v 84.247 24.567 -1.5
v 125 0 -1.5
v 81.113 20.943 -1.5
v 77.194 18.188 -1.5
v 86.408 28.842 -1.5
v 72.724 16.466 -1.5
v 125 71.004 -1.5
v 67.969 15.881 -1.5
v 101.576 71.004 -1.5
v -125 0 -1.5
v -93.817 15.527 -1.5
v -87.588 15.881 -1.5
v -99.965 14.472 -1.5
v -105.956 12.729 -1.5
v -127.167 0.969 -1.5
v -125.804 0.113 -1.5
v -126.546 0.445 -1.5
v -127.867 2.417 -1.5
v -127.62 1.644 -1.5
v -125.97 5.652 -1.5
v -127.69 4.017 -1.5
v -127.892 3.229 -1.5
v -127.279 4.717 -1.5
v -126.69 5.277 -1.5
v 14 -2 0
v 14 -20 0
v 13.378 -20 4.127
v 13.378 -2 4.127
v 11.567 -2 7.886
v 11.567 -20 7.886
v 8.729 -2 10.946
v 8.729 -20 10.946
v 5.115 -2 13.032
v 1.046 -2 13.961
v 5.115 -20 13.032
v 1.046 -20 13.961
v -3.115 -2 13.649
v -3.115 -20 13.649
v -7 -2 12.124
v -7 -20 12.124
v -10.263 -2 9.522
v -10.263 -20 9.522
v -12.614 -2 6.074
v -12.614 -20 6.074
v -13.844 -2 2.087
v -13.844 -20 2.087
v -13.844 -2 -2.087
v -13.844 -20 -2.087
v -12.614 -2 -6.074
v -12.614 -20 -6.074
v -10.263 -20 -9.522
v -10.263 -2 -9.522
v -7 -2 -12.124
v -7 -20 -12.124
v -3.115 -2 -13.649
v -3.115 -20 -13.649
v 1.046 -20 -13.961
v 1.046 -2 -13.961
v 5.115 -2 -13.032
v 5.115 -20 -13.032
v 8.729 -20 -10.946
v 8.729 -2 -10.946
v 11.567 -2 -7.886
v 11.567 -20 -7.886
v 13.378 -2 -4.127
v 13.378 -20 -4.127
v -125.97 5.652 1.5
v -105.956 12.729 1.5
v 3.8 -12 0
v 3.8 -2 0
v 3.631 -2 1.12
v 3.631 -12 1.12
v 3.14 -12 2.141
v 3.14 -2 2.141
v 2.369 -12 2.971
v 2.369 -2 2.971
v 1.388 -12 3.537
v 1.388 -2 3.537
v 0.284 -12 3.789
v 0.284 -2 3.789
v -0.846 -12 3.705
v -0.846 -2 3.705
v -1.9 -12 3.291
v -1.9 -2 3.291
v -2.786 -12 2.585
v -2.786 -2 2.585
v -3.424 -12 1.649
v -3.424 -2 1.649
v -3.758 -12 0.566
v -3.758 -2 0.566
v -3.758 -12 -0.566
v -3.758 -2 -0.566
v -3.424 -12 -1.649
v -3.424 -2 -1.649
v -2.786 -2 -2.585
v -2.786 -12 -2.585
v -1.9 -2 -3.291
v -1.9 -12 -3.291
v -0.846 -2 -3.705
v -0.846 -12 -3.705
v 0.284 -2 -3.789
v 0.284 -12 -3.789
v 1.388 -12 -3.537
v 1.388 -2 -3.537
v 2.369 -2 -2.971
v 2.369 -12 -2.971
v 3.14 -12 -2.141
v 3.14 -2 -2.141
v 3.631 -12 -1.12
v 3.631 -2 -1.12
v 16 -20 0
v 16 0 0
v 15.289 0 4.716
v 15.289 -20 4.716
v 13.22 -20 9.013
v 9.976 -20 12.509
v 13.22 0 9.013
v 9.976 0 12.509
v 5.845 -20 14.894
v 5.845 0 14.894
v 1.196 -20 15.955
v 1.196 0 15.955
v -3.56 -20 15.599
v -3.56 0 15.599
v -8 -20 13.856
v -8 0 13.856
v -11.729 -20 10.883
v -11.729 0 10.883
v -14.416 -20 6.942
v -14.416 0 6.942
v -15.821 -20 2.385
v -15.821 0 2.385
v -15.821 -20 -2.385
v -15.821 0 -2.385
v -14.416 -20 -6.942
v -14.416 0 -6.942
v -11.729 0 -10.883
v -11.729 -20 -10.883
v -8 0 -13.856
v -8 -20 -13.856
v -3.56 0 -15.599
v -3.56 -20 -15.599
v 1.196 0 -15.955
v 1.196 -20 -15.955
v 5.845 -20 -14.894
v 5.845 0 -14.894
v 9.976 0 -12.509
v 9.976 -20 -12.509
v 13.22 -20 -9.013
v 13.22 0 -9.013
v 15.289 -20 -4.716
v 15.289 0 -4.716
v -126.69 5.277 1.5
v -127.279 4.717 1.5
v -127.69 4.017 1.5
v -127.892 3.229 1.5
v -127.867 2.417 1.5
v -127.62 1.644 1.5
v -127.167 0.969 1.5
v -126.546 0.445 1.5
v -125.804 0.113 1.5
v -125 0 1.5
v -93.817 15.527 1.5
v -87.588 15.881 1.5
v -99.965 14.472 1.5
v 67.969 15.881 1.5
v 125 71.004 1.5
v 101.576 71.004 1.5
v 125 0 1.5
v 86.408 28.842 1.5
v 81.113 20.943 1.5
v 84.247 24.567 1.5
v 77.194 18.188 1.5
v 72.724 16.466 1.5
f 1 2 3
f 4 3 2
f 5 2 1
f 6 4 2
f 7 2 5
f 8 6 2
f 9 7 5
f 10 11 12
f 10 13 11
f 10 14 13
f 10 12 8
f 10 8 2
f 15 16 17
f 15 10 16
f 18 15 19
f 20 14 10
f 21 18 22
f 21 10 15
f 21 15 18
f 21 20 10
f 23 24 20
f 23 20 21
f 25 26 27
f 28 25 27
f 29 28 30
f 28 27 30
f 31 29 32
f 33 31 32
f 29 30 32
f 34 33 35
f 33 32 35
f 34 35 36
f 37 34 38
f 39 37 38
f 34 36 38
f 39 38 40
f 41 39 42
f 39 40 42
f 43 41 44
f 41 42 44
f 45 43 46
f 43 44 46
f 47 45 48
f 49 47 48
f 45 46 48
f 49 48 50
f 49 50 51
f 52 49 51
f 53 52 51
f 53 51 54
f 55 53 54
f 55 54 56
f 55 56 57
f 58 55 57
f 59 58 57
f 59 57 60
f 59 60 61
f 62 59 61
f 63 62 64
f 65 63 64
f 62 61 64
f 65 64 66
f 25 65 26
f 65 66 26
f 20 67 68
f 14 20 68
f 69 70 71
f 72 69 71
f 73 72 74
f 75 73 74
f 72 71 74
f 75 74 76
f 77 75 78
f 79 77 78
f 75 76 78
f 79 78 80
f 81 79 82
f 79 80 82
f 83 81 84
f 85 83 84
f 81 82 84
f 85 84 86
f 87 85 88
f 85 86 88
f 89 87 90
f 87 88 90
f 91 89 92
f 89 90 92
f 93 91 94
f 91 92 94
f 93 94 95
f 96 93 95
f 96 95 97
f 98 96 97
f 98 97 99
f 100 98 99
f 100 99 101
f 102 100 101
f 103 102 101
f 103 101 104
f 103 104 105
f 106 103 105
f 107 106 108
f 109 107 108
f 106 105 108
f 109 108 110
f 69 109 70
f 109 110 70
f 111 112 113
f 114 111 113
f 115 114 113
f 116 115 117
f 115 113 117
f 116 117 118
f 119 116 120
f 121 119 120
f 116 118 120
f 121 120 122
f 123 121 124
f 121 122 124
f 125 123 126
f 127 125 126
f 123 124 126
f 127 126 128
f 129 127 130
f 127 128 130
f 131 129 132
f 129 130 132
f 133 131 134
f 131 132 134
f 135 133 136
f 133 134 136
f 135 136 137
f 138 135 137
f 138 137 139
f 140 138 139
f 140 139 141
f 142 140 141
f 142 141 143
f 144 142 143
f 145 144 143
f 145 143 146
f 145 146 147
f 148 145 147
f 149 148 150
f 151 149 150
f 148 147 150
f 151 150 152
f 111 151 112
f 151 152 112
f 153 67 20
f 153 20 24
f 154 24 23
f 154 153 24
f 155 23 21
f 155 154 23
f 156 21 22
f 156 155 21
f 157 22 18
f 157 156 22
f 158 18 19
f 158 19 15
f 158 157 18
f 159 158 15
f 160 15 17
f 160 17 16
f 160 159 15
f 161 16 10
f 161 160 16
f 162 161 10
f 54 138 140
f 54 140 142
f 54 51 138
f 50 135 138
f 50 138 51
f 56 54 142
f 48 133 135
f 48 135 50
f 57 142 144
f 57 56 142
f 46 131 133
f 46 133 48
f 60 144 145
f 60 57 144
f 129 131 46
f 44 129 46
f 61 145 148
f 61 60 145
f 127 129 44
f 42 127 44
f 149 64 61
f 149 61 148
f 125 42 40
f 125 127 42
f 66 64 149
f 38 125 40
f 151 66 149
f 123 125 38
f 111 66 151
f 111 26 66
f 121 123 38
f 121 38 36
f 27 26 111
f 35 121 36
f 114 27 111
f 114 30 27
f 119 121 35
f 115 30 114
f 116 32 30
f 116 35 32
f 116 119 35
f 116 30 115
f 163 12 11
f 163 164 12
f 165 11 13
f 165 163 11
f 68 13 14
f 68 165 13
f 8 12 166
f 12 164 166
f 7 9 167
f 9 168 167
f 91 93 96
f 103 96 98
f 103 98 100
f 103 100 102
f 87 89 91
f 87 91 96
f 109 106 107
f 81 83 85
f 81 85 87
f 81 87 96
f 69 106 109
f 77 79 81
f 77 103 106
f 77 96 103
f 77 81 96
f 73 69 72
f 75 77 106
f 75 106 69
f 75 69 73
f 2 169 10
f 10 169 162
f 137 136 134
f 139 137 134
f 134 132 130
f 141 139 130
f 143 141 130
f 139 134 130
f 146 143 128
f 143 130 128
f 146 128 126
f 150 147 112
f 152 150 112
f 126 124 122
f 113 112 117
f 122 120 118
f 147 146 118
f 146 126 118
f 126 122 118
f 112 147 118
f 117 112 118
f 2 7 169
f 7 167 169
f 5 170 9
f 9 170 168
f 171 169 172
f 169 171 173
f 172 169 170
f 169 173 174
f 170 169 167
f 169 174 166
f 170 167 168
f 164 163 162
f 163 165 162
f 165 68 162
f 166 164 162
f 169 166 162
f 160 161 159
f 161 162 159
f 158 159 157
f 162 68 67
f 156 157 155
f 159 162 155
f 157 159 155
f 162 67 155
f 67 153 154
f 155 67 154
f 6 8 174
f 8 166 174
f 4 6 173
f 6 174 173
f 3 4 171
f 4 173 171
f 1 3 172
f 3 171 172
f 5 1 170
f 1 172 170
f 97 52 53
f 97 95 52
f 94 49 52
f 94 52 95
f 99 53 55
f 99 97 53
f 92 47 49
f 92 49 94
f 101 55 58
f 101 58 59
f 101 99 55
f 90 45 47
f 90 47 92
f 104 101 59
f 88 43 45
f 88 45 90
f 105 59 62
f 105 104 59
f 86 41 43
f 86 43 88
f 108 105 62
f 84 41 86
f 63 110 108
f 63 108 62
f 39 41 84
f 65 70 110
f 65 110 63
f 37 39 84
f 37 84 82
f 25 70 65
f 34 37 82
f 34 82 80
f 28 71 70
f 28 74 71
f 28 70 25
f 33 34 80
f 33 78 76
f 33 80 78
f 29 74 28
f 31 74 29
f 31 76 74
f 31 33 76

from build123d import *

# Parameters (mm, degrees)
PAD002_DEPTH    = 1.5
COPYSKETCH005_R = 16
PAD_DEPTH       = 20
COPYSKETCH006_R = 14
POCKET_DEPTH    = 18
COPYSKETCH007_R = 3.8
PAD001_DEPTH    = 10


with BuildPart() as body001:
    # CopySketch004 → Pad002 (new body, symmetric)
    with BuildSketch(Plane.XY):
        with BuildLine():
            Line((-125.969839, 5.652203), (-105.955548, 12.728901))
            ThreePointArc((-87.587906, 15.880533), (-96.90594, 15.08691), (-105.955548, 12.728901))
            Line((-87.587906, 15.880533), (-56.304531, 15.880533))
            Line((-56.304531, 15.880533), (67.96893, 15.880533))
            ThreePointArc((67.96893, 15.880533), (79.23833, 19.445245), (86.407644, 28.842452))
            Line((86.407644, 28.842452), (101.576416, 71.003891))
            Line((101.576416, 71.003891), (125, 71.003891))
            Line((125, 71.003891), (125, 0))
            Line((125, 0), (-125, 0))
            ThreePointArc((-125.969839, 5.652203), (-127.867402, 2.4173), (-125, 0))
        make_face()
    extrude(amount=PAD002_DEPTH, both=True)


with BuildPart() as body002:
    # CopySketch005 → Pad (new body)
    with BuildSketch(Plane.XZ):
        Circle(COPYSKETCH005_R)
    extrude(amount=PAD_DEPTH)

    # CopySketch006 → Pocket (cut)
    with BuildSketch(Plane.XZ.offset(20)):
        Circle(COPYSKETCH006_R)
    extrude(amount=-POCKET_DEPTH, mode=Mode.SUBTRACT)

    # CopySketch007 → Pad001 (join)
    with BuildSketch(Plane.XZ.offset(2)):
        Circle(COPYSKETCH007_R)
    extrude(amount=PAD001_DEPTH)


solid = Compound([body001.part, body002.part])
